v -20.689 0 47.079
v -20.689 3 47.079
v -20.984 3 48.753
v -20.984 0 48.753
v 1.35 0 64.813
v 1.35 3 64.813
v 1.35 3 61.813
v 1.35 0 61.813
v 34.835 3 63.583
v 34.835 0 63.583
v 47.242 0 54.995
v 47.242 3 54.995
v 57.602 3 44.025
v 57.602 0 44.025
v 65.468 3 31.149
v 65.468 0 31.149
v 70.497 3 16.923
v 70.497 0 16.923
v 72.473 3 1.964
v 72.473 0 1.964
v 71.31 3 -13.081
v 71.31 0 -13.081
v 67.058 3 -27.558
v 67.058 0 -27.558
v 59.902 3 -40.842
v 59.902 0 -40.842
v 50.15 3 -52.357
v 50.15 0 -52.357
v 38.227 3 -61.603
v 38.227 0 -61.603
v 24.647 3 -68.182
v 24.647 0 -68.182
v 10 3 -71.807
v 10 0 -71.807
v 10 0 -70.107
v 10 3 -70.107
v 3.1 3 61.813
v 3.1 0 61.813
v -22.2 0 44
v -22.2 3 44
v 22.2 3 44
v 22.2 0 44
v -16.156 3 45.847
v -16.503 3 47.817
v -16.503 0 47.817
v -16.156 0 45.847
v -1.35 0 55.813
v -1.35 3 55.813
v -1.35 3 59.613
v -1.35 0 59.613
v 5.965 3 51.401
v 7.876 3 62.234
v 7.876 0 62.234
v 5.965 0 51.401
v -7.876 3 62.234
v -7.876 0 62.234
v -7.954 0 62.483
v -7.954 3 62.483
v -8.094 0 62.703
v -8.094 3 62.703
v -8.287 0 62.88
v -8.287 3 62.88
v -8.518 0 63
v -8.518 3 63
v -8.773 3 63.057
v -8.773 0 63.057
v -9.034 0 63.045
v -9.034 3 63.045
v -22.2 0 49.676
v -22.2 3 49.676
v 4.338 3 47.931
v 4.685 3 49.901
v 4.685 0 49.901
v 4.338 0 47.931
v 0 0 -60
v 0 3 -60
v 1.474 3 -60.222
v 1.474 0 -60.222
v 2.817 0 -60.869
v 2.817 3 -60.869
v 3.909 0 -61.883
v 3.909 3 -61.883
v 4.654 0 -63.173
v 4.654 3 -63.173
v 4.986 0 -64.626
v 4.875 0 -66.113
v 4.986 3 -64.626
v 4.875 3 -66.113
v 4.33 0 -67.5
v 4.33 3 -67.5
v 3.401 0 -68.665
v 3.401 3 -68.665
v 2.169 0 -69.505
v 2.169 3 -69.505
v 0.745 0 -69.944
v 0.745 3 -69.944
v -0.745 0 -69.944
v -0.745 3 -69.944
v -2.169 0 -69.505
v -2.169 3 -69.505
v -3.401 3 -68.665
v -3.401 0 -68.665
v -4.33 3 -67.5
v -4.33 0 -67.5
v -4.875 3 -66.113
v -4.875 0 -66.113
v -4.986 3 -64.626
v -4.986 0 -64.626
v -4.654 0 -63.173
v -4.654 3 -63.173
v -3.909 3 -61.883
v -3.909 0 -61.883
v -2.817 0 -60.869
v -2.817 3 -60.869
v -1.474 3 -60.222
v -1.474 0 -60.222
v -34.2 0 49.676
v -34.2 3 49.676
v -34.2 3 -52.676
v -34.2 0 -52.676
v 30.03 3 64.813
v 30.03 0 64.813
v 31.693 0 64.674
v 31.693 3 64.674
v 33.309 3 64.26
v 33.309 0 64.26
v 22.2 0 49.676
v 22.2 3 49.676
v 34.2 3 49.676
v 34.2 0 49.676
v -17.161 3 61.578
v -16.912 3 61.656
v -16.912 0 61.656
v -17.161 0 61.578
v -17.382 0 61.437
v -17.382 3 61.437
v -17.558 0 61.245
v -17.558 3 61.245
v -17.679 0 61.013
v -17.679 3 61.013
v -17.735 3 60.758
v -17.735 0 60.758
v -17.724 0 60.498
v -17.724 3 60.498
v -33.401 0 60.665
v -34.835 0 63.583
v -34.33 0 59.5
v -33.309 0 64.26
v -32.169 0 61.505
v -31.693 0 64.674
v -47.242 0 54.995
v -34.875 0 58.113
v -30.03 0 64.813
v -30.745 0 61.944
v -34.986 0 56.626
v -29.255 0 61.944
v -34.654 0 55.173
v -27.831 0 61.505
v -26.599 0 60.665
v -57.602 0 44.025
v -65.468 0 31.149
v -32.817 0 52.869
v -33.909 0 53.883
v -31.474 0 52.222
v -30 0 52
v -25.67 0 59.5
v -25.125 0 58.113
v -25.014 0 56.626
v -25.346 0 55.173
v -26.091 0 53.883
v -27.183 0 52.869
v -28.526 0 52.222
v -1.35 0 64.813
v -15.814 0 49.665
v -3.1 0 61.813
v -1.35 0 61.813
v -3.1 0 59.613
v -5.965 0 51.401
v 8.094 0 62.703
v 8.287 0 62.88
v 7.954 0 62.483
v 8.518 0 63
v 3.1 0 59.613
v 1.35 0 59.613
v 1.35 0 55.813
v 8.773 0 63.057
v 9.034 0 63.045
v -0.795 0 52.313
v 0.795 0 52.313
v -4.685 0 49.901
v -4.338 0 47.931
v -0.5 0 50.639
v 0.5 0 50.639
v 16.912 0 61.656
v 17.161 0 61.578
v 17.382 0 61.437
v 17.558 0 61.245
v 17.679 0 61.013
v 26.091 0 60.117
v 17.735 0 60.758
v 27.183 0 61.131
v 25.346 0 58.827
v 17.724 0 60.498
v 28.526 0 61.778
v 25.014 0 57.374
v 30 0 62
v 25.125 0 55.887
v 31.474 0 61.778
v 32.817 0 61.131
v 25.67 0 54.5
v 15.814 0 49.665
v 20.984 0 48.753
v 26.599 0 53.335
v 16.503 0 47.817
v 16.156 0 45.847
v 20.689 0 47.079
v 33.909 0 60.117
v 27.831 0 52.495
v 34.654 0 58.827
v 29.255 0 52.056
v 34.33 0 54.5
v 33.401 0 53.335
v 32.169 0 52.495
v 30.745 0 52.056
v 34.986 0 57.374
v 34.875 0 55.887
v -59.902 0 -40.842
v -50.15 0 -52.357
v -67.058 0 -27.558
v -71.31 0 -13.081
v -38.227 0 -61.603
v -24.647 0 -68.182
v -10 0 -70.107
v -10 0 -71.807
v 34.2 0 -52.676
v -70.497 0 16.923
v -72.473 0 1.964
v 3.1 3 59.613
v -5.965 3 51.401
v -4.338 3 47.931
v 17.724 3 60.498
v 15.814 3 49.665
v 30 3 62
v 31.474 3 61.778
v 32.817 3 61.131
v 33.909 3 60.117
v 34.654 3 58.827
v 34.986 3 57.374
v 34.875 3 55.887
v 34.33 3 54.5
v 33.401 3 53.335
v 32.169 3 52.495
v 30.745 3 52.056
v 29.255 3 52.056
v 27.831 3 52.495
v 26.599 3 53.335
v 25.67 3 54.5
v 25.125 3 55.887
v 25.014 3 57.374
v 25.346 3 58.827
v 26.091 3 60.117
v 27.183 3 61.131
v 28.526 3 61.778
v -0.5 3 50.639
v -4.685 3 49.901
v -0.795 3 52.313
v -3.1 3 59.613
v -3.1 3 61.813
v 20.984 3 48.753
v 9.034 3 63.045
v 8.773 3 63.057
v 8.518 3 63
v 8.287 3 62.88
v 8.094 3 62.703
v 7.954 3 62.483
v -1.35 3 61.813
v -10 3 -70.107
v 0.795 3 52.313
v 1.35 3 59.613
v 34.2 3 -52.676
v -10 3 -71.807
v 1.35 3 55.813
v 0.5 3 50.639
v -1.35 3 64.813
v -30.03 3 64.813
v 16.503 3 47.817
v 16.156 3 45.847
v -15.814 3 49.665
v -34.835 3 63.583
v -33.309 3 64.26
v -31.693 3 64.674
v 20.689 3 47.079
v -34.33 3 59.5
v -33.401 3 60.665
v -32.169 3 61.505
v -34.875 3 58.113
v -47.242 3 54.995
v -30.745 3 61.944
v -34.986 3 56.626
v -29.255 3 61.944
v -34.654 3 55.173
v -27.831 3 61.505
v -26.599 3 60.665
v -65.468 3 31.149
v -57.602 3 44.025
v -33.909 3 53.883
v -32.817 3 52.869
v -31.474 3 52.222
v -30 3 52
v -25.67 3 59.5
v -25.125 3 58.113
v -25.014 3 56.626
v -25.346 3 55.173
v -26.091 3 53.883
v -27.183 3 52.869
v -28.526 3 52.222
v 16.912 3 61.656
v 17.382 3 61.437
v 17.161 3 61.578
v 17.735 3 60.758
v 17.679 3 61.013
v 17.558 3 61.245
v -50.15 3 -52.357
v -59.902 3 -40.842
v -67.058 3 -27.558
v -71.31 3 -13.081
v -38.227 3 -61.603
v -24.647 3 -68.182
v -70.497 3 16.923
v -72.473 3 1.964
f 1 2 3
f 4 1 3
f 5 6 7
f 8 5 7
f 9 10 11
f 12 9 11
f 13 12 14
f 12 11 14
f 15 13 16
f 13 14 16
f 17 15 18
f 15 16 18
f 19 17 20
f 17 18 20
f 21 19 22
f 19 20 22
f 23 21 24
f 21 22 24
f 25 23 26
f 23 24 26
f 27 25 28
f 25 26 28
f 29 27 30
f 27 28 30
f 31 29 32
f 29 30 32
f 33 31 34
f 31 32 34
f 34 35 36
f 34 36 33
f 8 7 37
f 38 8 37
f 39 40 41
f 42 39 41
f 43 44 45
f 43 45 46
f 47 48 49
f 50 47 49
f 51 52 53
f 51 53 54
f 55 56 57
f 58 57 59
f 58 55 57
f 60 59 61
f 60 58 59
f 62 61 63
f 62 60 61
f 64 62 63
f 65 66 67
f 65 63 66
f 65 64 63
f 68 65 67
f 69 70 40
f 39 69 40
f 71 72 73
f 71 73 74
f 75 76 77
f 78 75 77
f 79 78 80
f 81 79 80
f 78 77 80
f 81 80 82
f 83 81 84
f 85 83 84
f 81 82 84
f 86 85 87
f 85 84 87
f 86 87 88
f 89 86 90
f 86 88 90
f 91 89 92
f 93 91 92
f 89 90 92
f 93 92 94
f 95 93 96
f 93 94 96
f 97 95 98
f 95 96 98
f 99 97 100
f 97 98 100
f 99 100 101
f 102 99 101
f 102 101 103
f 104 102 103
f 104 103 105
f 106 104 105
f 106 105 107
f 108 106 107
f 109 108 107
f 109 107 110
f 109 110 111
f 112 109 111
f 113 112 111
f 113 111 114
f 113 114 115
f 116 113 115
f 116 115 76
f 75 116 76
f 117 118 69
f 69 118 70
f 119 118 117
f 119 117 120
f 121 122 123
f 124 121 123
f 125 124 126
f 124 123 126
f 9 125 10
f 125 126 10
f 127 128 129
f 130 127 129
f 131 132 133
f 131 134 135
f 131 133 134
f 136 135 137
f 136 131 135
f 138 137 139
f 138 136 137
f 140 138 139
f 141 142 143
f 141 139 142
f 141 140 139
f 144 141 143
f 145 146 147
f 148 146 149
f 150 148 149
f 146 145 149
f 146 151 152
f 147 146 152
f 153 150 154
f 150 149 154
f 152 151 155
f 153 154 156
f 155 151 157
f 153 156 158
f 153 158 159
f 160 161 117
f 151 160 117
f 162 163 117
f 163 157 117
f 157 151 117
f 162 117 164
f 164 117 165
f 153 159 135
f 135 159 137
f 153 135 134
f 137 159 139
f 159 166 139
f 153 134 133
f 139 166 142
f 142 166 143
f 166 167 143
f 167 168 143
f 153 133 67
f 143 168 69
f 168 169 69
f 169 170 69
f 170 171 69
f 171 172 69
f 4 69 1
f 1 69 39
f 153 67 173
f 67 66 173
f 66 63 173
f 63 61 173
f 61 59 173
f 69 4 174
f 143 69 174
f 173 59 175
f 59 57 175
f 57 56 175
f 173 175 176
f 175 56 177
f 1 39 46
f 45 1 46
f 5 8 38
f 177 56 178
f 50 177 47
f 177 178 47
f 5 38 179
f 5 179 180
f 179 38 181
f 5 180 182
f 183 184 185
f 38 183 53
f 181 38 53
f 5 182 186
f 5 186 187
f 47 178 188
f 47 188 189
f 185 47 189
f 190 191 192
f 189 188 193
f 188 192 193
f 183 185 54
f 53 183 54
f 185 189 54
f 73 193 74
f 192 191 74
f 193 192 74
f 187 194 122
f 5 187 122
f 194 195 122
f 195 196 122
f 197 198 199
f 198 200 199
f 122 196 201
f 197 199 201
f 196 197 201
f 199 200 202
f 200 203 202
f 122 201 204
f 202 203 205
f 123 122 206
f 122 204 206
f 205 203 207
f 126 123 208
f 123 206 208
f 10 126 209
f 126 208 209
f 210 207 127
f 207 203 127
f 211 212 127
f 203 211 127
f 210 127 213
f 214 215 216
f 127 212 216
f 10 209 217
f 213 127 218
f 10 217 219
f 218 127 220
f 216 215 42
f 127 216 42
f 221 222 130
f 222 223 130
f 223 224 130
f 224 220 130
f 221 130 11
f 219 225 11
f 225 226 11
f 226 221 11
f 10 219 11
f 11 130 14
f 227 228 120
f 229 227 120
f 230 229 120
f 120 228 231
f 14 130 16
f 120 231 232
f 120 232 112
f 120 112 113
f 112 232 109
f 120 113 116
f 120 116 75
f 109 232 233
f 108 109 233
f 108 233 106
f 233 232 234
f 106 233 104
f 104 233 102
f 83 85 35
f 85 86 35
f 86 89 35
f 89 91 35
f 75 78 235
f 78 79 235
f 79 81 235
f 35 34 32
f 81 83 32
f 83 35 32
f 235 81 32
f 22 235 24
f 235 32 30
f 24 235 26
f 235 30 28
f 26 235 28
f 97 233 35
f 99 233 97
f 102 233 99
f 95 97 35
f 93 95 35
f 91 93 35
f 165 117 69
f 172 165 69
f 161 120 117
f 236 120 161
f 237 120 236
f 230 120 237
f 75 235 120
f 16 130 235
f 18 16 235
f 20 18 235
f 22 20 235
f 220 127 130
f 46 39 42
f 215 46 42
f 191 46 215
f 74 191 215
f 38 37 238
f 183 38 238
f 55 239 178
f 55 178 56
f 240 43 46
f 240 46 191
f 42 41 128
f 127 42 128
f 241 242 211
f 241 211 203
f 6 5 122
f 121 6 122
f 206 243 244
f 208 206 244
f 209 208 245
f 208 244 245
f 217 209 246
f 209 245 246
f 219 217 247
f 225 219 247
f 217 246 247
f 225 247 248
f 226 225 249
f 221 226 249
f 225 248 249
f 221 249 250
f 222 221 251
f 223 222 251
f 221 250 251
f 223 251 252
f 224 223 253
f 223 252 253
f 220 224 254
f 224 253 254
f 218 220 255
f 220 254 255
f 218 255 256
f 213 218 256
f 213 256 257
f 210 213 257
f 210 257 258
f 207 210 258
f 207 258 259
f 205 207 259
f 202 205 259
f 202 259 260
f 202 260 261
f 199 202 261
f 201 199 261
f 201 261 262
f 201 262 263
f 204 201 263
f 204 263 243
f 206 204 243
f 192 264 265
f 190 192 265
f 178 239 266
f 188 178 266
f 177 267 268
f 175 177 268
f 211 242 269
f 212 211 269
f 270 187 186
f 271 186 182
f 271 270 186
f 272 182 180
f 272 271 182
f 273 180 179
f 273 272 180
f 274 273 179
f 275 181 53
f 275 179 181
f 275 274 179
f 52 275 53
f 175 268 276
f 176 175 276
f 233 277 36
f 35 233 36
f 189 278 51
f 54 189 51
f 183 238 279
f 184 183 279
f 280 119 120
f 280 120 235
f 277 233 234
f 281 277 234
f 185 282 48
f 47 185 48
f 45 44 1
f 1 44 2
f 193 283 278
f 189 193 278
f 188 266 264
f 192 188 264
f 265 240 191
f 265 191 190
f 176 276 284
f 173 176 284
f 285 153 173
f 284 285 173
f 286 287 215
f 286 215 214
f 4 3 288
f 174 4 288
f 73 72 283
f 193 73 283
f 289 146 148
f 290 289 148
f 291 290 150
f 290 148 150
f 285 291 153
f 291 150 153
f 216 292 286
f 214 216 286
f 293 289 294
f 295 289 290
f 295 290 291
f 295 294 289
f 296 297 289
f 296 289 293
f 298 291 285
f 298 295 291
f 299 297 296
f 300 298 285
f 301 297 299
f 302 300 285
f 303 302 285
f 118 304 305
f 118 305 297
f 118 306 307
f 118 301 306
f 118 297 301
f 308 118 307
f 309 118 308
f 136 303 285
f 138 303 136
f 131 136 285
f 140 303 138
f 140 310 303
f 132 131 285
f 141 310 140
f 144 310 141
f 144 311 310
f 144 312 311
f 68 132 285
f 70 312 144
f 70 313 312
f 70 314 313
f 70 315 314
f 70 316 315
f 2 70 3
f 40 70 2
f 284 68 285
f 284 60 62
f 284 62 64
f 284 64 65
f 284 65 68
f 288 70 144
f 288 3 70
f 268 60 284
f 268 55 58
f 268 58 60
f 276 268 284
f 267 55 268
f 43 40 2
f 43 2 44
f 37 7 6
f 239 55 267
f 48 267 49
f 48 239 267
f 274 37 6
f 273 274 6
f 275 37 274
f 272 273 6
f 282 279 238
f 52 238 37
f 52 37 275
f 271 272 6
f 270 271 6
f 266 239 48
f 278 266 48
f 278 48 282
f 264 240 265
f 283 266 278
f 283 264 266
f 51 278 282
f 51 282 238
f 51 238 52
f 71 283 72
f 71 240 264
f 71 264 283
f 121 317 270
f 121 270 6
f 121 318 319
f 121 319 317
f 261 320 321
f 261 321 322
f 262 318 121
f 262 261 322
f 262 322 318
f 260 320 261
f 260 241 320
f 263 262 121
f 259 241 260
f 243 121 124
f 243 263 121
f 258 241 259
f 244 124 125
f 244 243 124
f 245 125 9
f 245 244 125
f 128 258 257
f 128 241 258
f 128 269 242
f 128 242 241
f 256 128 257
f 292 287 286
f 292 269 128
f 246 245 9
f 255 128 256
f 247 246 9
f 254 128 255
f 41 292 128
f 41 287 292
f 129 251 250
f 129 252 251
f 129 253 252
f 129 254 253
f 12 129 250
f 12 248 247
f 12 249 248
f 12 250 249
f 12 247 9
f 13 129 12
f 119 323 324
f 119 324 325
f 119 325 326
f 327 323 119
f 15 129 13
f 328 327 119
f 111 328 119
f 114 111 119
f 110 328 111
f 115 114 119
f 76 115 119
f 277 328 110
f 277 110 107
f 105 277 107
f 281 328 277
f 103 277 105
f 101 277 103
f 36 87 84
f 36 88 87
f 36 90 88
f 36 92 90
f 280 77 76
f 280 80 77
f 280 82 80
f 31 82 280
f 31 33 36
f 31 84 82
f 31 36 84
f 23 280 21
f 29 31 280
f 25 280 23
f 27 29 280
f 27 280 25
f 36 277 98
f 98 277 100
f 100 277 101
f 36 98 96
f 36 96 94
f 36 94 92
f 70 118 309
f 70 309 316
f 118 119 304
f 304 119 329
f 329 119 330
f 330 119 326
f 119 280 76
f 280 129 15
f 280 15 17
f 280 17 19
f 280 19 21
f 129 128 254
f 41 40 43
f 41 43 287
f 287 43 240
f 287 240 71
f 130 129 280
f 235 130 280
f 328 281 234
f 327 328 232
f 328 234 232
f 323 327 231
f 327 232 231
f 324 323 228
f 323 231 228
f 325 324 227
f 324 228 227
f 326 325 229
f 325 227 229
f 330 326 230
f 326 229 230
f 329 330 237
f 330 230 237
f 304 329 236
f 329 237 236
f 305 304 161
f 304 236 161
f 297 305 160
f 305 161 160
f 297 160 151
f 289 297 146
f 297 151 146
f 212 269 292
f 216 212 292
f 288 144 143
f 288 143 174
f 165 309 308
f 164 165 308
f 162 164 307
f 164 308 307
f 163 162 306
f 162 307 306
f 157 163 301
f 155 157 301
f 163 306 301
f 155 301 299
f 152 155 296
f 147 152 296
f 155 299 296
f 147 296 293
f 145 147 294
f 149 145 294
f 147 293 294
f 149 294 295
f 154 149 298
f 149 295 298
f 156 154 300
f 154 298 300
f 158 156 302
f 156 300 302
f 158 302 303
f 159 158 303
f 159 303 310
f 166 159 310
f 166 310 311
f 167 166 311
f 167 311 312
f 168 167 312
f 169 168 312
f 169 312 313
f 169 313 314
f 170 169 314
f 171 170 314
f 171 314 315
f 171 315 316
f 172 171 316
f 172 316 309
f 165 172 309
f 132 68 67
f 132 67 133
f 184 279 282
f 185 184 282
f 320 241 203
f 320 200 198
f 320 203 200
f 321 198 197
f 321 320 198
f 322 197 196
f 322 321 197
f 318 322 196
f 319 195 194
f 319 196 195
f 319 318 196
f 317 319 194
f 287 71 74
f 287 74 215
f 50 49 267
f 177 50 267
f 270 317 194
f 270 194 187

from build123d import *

# Parameters (mm, degrees)
BOSS_EXTRUDE1_DEPTH = 3
CUT_EXTRUDE1_DEPTH  = 103.574363269
CUT_EXTRUDE3_DEPTH  = 103.574363269
CUT_EXTRUDE4_DEPTH  = 103.574363269
SKETCH6_W           = 68.4
SKETCH6_H           = 3
CUT_EXTRUDE5_DEPTH  = 103.574363269
SKETCH7_R           = 5
CUT_EXTRUDE6_DEPTH  = 103.574363269
SKETCH11_R          = 5
CUT_EXTRUDE10_DEPTH = 103.574363269
SKETCH15_W          = 20
SKETCH15_H          = 1.7
CUT_EXTRUDE14_DEPTH = 103.574363269
CUT_EXTRUDE15_DEPTH = 103.085748271


with BuildPart() as part:
    # Sketch1 → Boss-Extrude1 (new body)
    with BuildSketch(Plane(origin=(0, 0, 0), x_dir=(1, 0, 0), z_dir=(0, 1, 0))):
        with BuildLine():
            Line((-30.029977361, -64.812867647), (30.029977361, -64.812867647))
            ThreePointArc((30.029977361, -64.812867647), (32.509837414, -64.500503794), (34.834773739, -63.582926471))
            ThreePointArc((34.834773739, -63.582926471), (0, 72.5), (-34.834773739, -63.582926471))
            ThreePointArc((-34.834773739, -63.582926471), (-32.509837414, -64.500503794), (-30.029977361, -64.812867647))
        make_face()
    extrude(amount=BOSS_EXTRUDE1_DEPTH)

    # Sketch2 → Cut-Extrude1 (cut, through all)
    with BuildSketch(Plane(origin=(0, 3, 0), x_dir=(1, 0, 0), z_dir=(0, 1, 0))):
        Polygon((-34.2, -49.675685802), (-22.2, -49.675685802), (-22.2, -44), (22.2, -44), (22.2, -49.675685802), (34.2, -49.675685802), (34.2, 49.675685802), (22.2, 49.675685802), (22.2, 44), (-22.2, 44), (-22.2, 49.675685802), (-34.2, 49.675685802), align=None)
    extrude(amount=-CUT_EXTRUDE1_DEPTH, mode=Mode.SUBTRACT)

    # Sketch4 → Cut-Extrude3 (cut, through all)
    with BuildSketch(Plane(origin=(0, 3, 0), x_dir=(1, 0, 0), z_dir=(0, 1, 0))):
        Polygon((-20.983760839, -48.753080005), (-0.795201902, -52.312867647), (-0.5, -50.638694467), (-20.688558937, -47.078906825), align=None)
        Polygon((20.983760839, -48.753080005), (20.688558937, -47.078906825), (0.5, -50.638694467), (0.795201902, -52.312867647), align=None)
    extrude(amount=-CUT_EXTRUDE3_DEPTH, mode=Mode.SUBTRACT)

    # Sketch5 → Cut-Extrude4 (cut, through all)
    with BuildSketch(Plane(origin=(0, 3, 0), x_dir=(1, 0, 0), z_dir=(0, 1, 0))):
        with BuildLine():
            Line((5.965442605, -51.401214714), (15.813520135, -49.664732938))
            Line((15.813520135, -49.664732938), (17.72365009, -60.497618221))
            ThreePointArc((17.72365009, -60.497618221), (17.557994381, -61.244842835), (16.912490514, -61.656074151))
            Line((16.912490514, -61.656074151), (9.03402849, -63.045259573))
            ThreePointArc((9.03402849, -63.045259573), (8.286803876, -62.879603864), (7.87557256, -62.234099997))
            Line((7.87557256, -62.234099997), (5.965442605, -51.401214714))
        make_face()
        Polygon((16.503125986, -47.81691158), (4.68543295, -49.900689712), (4.338136595, -47.931074206), (16.155829631, -45.847296074), align=None)
        Polygon((-16.155829631, -45.847296074), (-4.338136595, -47.931074206), (-4.68543295, -49.900689712), (-16.503125986, -47.81691158), align=None)
        with BuildLine():
            Line((-9.03402849, -63.045259573), (-16.912490514, -61.656074151))
            ThreePointArc((-16.912490514, -61.656074151), (-17.557994381, -61.244842835), (-17.72365009, -60.497618221))
            Line((-17.72365009, -60.497618221), (-15.813520135, -49.664732938))
            Line((-15.813520135, -49.664732938), (-5.965442605, -51.401214714))
            Line((-5.965442605, -51.401214714), (-7.87557256, -62.234099997))
            ThreePointArc((-7.87557256, -62.234099997), (-8.286803876, -62.879603864), (-9.03402849, -63.045259573))
        make_face()
    extrude(amount=-CUT_EXTRUDE4_DEPTH, mode=Mode.SUBTRACT)

    # Sketch6 → Cut-Extrude5 (cut, through all)
    with BuildSketch(Plane(origin=(0, 3, 0), x_dir=(1, 0, 0), z_dir=(0, 1, 0))):
        with Locations((0, 51.175685802)):
            Rectangle(SKETCH6_W, SKETCH6_H)
    extrude(amount=-CUT_EXTRUDE5_DEPTH, mode=Mode.SUBTRACT)


with BuildPart() as cut_extrude5_kept_piece:
    # of the separate pieces the step leaves, the one the design keeps (cut_extrude5_pieces_kept)
    add(part.part.solids().sort_by_distance((-34.834773739, 0, 63.582926471))[0])

    # Sketch7 → Cut-Extrude6 (cut, through all)
    with BuildSketch(Plane(origin=(0, 3, 0), x_dir=(1, 0, 0), z_dir=(0, 1, 0))):
        with Locations(Location((-30, -57, 0), (0, 0, 90))):
            Circle(SKETCH7_R)
        with Locations(Location((30, -57, 0), (0, 0, 270))):
            Circle(SKETCH7_R)
    extrude(amount=-CUT_EXTRUDE6_DEPTH, mode=Mode.SUBTRACT)

    # Sketch11 → Cut-Extrude10 (cut, through all)
    with BuildSketch(Plane(origin=(0, 3, 0), x_dir=(1, 0, 0), z_dir=(0, 1, 0))):
        with Locations(Location((0, 65, 0), (0, 0, 270))):
            Circle(SKETCH11_R)
    extrude(amount=-CUT_EXTRUDE10_DEPTH, mode=Mode.SUBTRACT)

    # Sketch15 → Cut-Extrude14 (cut, through all)
    with BuildSketch(Plane(origin=(0, 3, 0), x_dir=(1, 0, 0), z_dir=(0, 1, 0))):
        with Locations((0, 70.957033082)):
            Rectangle(SKETCH15_W, SKETCH15_H)
    extrude(amount=-CUT_EXTRUDE14_DEPTH, mode=Mode.SUBTRACT)


with BuildPart() as body_2:
    # of the pieces the cut leaves, the one that is kept (cut_extrude14_keep)
    add(cut_extrude5_kept_piece.part.solids().sort_by_distance((-34.834773739, 0, 63.582926471))[0])

    # Sketch16 → Cut-Extrude15 (cut, through all)
    with BuildSketch(Plane(origin=(0, 3, 0), x_dir=(1, 0, 0), z_dir=(0, 1, 0))):
        Polygon((-1.35, -64.812867647), (1.35, -64.812867647), (1.35, -61.812867647), (3.1, -61.812867647), (3.1, -59.612867647), (1.35, -59.612867647), (1.35, -55.812867647), (-1.35, -55.812867647), (-1.35, -59.612867647), (-3.1, -59.612867647), (-3.1, -61.812867647), (-1.35, -61.812867647), align=None)
    extrude(amount=-CUT_EXTRUDE15_DEPTH, mode=Mode.SUBTRACT)


solid = body_2.part
